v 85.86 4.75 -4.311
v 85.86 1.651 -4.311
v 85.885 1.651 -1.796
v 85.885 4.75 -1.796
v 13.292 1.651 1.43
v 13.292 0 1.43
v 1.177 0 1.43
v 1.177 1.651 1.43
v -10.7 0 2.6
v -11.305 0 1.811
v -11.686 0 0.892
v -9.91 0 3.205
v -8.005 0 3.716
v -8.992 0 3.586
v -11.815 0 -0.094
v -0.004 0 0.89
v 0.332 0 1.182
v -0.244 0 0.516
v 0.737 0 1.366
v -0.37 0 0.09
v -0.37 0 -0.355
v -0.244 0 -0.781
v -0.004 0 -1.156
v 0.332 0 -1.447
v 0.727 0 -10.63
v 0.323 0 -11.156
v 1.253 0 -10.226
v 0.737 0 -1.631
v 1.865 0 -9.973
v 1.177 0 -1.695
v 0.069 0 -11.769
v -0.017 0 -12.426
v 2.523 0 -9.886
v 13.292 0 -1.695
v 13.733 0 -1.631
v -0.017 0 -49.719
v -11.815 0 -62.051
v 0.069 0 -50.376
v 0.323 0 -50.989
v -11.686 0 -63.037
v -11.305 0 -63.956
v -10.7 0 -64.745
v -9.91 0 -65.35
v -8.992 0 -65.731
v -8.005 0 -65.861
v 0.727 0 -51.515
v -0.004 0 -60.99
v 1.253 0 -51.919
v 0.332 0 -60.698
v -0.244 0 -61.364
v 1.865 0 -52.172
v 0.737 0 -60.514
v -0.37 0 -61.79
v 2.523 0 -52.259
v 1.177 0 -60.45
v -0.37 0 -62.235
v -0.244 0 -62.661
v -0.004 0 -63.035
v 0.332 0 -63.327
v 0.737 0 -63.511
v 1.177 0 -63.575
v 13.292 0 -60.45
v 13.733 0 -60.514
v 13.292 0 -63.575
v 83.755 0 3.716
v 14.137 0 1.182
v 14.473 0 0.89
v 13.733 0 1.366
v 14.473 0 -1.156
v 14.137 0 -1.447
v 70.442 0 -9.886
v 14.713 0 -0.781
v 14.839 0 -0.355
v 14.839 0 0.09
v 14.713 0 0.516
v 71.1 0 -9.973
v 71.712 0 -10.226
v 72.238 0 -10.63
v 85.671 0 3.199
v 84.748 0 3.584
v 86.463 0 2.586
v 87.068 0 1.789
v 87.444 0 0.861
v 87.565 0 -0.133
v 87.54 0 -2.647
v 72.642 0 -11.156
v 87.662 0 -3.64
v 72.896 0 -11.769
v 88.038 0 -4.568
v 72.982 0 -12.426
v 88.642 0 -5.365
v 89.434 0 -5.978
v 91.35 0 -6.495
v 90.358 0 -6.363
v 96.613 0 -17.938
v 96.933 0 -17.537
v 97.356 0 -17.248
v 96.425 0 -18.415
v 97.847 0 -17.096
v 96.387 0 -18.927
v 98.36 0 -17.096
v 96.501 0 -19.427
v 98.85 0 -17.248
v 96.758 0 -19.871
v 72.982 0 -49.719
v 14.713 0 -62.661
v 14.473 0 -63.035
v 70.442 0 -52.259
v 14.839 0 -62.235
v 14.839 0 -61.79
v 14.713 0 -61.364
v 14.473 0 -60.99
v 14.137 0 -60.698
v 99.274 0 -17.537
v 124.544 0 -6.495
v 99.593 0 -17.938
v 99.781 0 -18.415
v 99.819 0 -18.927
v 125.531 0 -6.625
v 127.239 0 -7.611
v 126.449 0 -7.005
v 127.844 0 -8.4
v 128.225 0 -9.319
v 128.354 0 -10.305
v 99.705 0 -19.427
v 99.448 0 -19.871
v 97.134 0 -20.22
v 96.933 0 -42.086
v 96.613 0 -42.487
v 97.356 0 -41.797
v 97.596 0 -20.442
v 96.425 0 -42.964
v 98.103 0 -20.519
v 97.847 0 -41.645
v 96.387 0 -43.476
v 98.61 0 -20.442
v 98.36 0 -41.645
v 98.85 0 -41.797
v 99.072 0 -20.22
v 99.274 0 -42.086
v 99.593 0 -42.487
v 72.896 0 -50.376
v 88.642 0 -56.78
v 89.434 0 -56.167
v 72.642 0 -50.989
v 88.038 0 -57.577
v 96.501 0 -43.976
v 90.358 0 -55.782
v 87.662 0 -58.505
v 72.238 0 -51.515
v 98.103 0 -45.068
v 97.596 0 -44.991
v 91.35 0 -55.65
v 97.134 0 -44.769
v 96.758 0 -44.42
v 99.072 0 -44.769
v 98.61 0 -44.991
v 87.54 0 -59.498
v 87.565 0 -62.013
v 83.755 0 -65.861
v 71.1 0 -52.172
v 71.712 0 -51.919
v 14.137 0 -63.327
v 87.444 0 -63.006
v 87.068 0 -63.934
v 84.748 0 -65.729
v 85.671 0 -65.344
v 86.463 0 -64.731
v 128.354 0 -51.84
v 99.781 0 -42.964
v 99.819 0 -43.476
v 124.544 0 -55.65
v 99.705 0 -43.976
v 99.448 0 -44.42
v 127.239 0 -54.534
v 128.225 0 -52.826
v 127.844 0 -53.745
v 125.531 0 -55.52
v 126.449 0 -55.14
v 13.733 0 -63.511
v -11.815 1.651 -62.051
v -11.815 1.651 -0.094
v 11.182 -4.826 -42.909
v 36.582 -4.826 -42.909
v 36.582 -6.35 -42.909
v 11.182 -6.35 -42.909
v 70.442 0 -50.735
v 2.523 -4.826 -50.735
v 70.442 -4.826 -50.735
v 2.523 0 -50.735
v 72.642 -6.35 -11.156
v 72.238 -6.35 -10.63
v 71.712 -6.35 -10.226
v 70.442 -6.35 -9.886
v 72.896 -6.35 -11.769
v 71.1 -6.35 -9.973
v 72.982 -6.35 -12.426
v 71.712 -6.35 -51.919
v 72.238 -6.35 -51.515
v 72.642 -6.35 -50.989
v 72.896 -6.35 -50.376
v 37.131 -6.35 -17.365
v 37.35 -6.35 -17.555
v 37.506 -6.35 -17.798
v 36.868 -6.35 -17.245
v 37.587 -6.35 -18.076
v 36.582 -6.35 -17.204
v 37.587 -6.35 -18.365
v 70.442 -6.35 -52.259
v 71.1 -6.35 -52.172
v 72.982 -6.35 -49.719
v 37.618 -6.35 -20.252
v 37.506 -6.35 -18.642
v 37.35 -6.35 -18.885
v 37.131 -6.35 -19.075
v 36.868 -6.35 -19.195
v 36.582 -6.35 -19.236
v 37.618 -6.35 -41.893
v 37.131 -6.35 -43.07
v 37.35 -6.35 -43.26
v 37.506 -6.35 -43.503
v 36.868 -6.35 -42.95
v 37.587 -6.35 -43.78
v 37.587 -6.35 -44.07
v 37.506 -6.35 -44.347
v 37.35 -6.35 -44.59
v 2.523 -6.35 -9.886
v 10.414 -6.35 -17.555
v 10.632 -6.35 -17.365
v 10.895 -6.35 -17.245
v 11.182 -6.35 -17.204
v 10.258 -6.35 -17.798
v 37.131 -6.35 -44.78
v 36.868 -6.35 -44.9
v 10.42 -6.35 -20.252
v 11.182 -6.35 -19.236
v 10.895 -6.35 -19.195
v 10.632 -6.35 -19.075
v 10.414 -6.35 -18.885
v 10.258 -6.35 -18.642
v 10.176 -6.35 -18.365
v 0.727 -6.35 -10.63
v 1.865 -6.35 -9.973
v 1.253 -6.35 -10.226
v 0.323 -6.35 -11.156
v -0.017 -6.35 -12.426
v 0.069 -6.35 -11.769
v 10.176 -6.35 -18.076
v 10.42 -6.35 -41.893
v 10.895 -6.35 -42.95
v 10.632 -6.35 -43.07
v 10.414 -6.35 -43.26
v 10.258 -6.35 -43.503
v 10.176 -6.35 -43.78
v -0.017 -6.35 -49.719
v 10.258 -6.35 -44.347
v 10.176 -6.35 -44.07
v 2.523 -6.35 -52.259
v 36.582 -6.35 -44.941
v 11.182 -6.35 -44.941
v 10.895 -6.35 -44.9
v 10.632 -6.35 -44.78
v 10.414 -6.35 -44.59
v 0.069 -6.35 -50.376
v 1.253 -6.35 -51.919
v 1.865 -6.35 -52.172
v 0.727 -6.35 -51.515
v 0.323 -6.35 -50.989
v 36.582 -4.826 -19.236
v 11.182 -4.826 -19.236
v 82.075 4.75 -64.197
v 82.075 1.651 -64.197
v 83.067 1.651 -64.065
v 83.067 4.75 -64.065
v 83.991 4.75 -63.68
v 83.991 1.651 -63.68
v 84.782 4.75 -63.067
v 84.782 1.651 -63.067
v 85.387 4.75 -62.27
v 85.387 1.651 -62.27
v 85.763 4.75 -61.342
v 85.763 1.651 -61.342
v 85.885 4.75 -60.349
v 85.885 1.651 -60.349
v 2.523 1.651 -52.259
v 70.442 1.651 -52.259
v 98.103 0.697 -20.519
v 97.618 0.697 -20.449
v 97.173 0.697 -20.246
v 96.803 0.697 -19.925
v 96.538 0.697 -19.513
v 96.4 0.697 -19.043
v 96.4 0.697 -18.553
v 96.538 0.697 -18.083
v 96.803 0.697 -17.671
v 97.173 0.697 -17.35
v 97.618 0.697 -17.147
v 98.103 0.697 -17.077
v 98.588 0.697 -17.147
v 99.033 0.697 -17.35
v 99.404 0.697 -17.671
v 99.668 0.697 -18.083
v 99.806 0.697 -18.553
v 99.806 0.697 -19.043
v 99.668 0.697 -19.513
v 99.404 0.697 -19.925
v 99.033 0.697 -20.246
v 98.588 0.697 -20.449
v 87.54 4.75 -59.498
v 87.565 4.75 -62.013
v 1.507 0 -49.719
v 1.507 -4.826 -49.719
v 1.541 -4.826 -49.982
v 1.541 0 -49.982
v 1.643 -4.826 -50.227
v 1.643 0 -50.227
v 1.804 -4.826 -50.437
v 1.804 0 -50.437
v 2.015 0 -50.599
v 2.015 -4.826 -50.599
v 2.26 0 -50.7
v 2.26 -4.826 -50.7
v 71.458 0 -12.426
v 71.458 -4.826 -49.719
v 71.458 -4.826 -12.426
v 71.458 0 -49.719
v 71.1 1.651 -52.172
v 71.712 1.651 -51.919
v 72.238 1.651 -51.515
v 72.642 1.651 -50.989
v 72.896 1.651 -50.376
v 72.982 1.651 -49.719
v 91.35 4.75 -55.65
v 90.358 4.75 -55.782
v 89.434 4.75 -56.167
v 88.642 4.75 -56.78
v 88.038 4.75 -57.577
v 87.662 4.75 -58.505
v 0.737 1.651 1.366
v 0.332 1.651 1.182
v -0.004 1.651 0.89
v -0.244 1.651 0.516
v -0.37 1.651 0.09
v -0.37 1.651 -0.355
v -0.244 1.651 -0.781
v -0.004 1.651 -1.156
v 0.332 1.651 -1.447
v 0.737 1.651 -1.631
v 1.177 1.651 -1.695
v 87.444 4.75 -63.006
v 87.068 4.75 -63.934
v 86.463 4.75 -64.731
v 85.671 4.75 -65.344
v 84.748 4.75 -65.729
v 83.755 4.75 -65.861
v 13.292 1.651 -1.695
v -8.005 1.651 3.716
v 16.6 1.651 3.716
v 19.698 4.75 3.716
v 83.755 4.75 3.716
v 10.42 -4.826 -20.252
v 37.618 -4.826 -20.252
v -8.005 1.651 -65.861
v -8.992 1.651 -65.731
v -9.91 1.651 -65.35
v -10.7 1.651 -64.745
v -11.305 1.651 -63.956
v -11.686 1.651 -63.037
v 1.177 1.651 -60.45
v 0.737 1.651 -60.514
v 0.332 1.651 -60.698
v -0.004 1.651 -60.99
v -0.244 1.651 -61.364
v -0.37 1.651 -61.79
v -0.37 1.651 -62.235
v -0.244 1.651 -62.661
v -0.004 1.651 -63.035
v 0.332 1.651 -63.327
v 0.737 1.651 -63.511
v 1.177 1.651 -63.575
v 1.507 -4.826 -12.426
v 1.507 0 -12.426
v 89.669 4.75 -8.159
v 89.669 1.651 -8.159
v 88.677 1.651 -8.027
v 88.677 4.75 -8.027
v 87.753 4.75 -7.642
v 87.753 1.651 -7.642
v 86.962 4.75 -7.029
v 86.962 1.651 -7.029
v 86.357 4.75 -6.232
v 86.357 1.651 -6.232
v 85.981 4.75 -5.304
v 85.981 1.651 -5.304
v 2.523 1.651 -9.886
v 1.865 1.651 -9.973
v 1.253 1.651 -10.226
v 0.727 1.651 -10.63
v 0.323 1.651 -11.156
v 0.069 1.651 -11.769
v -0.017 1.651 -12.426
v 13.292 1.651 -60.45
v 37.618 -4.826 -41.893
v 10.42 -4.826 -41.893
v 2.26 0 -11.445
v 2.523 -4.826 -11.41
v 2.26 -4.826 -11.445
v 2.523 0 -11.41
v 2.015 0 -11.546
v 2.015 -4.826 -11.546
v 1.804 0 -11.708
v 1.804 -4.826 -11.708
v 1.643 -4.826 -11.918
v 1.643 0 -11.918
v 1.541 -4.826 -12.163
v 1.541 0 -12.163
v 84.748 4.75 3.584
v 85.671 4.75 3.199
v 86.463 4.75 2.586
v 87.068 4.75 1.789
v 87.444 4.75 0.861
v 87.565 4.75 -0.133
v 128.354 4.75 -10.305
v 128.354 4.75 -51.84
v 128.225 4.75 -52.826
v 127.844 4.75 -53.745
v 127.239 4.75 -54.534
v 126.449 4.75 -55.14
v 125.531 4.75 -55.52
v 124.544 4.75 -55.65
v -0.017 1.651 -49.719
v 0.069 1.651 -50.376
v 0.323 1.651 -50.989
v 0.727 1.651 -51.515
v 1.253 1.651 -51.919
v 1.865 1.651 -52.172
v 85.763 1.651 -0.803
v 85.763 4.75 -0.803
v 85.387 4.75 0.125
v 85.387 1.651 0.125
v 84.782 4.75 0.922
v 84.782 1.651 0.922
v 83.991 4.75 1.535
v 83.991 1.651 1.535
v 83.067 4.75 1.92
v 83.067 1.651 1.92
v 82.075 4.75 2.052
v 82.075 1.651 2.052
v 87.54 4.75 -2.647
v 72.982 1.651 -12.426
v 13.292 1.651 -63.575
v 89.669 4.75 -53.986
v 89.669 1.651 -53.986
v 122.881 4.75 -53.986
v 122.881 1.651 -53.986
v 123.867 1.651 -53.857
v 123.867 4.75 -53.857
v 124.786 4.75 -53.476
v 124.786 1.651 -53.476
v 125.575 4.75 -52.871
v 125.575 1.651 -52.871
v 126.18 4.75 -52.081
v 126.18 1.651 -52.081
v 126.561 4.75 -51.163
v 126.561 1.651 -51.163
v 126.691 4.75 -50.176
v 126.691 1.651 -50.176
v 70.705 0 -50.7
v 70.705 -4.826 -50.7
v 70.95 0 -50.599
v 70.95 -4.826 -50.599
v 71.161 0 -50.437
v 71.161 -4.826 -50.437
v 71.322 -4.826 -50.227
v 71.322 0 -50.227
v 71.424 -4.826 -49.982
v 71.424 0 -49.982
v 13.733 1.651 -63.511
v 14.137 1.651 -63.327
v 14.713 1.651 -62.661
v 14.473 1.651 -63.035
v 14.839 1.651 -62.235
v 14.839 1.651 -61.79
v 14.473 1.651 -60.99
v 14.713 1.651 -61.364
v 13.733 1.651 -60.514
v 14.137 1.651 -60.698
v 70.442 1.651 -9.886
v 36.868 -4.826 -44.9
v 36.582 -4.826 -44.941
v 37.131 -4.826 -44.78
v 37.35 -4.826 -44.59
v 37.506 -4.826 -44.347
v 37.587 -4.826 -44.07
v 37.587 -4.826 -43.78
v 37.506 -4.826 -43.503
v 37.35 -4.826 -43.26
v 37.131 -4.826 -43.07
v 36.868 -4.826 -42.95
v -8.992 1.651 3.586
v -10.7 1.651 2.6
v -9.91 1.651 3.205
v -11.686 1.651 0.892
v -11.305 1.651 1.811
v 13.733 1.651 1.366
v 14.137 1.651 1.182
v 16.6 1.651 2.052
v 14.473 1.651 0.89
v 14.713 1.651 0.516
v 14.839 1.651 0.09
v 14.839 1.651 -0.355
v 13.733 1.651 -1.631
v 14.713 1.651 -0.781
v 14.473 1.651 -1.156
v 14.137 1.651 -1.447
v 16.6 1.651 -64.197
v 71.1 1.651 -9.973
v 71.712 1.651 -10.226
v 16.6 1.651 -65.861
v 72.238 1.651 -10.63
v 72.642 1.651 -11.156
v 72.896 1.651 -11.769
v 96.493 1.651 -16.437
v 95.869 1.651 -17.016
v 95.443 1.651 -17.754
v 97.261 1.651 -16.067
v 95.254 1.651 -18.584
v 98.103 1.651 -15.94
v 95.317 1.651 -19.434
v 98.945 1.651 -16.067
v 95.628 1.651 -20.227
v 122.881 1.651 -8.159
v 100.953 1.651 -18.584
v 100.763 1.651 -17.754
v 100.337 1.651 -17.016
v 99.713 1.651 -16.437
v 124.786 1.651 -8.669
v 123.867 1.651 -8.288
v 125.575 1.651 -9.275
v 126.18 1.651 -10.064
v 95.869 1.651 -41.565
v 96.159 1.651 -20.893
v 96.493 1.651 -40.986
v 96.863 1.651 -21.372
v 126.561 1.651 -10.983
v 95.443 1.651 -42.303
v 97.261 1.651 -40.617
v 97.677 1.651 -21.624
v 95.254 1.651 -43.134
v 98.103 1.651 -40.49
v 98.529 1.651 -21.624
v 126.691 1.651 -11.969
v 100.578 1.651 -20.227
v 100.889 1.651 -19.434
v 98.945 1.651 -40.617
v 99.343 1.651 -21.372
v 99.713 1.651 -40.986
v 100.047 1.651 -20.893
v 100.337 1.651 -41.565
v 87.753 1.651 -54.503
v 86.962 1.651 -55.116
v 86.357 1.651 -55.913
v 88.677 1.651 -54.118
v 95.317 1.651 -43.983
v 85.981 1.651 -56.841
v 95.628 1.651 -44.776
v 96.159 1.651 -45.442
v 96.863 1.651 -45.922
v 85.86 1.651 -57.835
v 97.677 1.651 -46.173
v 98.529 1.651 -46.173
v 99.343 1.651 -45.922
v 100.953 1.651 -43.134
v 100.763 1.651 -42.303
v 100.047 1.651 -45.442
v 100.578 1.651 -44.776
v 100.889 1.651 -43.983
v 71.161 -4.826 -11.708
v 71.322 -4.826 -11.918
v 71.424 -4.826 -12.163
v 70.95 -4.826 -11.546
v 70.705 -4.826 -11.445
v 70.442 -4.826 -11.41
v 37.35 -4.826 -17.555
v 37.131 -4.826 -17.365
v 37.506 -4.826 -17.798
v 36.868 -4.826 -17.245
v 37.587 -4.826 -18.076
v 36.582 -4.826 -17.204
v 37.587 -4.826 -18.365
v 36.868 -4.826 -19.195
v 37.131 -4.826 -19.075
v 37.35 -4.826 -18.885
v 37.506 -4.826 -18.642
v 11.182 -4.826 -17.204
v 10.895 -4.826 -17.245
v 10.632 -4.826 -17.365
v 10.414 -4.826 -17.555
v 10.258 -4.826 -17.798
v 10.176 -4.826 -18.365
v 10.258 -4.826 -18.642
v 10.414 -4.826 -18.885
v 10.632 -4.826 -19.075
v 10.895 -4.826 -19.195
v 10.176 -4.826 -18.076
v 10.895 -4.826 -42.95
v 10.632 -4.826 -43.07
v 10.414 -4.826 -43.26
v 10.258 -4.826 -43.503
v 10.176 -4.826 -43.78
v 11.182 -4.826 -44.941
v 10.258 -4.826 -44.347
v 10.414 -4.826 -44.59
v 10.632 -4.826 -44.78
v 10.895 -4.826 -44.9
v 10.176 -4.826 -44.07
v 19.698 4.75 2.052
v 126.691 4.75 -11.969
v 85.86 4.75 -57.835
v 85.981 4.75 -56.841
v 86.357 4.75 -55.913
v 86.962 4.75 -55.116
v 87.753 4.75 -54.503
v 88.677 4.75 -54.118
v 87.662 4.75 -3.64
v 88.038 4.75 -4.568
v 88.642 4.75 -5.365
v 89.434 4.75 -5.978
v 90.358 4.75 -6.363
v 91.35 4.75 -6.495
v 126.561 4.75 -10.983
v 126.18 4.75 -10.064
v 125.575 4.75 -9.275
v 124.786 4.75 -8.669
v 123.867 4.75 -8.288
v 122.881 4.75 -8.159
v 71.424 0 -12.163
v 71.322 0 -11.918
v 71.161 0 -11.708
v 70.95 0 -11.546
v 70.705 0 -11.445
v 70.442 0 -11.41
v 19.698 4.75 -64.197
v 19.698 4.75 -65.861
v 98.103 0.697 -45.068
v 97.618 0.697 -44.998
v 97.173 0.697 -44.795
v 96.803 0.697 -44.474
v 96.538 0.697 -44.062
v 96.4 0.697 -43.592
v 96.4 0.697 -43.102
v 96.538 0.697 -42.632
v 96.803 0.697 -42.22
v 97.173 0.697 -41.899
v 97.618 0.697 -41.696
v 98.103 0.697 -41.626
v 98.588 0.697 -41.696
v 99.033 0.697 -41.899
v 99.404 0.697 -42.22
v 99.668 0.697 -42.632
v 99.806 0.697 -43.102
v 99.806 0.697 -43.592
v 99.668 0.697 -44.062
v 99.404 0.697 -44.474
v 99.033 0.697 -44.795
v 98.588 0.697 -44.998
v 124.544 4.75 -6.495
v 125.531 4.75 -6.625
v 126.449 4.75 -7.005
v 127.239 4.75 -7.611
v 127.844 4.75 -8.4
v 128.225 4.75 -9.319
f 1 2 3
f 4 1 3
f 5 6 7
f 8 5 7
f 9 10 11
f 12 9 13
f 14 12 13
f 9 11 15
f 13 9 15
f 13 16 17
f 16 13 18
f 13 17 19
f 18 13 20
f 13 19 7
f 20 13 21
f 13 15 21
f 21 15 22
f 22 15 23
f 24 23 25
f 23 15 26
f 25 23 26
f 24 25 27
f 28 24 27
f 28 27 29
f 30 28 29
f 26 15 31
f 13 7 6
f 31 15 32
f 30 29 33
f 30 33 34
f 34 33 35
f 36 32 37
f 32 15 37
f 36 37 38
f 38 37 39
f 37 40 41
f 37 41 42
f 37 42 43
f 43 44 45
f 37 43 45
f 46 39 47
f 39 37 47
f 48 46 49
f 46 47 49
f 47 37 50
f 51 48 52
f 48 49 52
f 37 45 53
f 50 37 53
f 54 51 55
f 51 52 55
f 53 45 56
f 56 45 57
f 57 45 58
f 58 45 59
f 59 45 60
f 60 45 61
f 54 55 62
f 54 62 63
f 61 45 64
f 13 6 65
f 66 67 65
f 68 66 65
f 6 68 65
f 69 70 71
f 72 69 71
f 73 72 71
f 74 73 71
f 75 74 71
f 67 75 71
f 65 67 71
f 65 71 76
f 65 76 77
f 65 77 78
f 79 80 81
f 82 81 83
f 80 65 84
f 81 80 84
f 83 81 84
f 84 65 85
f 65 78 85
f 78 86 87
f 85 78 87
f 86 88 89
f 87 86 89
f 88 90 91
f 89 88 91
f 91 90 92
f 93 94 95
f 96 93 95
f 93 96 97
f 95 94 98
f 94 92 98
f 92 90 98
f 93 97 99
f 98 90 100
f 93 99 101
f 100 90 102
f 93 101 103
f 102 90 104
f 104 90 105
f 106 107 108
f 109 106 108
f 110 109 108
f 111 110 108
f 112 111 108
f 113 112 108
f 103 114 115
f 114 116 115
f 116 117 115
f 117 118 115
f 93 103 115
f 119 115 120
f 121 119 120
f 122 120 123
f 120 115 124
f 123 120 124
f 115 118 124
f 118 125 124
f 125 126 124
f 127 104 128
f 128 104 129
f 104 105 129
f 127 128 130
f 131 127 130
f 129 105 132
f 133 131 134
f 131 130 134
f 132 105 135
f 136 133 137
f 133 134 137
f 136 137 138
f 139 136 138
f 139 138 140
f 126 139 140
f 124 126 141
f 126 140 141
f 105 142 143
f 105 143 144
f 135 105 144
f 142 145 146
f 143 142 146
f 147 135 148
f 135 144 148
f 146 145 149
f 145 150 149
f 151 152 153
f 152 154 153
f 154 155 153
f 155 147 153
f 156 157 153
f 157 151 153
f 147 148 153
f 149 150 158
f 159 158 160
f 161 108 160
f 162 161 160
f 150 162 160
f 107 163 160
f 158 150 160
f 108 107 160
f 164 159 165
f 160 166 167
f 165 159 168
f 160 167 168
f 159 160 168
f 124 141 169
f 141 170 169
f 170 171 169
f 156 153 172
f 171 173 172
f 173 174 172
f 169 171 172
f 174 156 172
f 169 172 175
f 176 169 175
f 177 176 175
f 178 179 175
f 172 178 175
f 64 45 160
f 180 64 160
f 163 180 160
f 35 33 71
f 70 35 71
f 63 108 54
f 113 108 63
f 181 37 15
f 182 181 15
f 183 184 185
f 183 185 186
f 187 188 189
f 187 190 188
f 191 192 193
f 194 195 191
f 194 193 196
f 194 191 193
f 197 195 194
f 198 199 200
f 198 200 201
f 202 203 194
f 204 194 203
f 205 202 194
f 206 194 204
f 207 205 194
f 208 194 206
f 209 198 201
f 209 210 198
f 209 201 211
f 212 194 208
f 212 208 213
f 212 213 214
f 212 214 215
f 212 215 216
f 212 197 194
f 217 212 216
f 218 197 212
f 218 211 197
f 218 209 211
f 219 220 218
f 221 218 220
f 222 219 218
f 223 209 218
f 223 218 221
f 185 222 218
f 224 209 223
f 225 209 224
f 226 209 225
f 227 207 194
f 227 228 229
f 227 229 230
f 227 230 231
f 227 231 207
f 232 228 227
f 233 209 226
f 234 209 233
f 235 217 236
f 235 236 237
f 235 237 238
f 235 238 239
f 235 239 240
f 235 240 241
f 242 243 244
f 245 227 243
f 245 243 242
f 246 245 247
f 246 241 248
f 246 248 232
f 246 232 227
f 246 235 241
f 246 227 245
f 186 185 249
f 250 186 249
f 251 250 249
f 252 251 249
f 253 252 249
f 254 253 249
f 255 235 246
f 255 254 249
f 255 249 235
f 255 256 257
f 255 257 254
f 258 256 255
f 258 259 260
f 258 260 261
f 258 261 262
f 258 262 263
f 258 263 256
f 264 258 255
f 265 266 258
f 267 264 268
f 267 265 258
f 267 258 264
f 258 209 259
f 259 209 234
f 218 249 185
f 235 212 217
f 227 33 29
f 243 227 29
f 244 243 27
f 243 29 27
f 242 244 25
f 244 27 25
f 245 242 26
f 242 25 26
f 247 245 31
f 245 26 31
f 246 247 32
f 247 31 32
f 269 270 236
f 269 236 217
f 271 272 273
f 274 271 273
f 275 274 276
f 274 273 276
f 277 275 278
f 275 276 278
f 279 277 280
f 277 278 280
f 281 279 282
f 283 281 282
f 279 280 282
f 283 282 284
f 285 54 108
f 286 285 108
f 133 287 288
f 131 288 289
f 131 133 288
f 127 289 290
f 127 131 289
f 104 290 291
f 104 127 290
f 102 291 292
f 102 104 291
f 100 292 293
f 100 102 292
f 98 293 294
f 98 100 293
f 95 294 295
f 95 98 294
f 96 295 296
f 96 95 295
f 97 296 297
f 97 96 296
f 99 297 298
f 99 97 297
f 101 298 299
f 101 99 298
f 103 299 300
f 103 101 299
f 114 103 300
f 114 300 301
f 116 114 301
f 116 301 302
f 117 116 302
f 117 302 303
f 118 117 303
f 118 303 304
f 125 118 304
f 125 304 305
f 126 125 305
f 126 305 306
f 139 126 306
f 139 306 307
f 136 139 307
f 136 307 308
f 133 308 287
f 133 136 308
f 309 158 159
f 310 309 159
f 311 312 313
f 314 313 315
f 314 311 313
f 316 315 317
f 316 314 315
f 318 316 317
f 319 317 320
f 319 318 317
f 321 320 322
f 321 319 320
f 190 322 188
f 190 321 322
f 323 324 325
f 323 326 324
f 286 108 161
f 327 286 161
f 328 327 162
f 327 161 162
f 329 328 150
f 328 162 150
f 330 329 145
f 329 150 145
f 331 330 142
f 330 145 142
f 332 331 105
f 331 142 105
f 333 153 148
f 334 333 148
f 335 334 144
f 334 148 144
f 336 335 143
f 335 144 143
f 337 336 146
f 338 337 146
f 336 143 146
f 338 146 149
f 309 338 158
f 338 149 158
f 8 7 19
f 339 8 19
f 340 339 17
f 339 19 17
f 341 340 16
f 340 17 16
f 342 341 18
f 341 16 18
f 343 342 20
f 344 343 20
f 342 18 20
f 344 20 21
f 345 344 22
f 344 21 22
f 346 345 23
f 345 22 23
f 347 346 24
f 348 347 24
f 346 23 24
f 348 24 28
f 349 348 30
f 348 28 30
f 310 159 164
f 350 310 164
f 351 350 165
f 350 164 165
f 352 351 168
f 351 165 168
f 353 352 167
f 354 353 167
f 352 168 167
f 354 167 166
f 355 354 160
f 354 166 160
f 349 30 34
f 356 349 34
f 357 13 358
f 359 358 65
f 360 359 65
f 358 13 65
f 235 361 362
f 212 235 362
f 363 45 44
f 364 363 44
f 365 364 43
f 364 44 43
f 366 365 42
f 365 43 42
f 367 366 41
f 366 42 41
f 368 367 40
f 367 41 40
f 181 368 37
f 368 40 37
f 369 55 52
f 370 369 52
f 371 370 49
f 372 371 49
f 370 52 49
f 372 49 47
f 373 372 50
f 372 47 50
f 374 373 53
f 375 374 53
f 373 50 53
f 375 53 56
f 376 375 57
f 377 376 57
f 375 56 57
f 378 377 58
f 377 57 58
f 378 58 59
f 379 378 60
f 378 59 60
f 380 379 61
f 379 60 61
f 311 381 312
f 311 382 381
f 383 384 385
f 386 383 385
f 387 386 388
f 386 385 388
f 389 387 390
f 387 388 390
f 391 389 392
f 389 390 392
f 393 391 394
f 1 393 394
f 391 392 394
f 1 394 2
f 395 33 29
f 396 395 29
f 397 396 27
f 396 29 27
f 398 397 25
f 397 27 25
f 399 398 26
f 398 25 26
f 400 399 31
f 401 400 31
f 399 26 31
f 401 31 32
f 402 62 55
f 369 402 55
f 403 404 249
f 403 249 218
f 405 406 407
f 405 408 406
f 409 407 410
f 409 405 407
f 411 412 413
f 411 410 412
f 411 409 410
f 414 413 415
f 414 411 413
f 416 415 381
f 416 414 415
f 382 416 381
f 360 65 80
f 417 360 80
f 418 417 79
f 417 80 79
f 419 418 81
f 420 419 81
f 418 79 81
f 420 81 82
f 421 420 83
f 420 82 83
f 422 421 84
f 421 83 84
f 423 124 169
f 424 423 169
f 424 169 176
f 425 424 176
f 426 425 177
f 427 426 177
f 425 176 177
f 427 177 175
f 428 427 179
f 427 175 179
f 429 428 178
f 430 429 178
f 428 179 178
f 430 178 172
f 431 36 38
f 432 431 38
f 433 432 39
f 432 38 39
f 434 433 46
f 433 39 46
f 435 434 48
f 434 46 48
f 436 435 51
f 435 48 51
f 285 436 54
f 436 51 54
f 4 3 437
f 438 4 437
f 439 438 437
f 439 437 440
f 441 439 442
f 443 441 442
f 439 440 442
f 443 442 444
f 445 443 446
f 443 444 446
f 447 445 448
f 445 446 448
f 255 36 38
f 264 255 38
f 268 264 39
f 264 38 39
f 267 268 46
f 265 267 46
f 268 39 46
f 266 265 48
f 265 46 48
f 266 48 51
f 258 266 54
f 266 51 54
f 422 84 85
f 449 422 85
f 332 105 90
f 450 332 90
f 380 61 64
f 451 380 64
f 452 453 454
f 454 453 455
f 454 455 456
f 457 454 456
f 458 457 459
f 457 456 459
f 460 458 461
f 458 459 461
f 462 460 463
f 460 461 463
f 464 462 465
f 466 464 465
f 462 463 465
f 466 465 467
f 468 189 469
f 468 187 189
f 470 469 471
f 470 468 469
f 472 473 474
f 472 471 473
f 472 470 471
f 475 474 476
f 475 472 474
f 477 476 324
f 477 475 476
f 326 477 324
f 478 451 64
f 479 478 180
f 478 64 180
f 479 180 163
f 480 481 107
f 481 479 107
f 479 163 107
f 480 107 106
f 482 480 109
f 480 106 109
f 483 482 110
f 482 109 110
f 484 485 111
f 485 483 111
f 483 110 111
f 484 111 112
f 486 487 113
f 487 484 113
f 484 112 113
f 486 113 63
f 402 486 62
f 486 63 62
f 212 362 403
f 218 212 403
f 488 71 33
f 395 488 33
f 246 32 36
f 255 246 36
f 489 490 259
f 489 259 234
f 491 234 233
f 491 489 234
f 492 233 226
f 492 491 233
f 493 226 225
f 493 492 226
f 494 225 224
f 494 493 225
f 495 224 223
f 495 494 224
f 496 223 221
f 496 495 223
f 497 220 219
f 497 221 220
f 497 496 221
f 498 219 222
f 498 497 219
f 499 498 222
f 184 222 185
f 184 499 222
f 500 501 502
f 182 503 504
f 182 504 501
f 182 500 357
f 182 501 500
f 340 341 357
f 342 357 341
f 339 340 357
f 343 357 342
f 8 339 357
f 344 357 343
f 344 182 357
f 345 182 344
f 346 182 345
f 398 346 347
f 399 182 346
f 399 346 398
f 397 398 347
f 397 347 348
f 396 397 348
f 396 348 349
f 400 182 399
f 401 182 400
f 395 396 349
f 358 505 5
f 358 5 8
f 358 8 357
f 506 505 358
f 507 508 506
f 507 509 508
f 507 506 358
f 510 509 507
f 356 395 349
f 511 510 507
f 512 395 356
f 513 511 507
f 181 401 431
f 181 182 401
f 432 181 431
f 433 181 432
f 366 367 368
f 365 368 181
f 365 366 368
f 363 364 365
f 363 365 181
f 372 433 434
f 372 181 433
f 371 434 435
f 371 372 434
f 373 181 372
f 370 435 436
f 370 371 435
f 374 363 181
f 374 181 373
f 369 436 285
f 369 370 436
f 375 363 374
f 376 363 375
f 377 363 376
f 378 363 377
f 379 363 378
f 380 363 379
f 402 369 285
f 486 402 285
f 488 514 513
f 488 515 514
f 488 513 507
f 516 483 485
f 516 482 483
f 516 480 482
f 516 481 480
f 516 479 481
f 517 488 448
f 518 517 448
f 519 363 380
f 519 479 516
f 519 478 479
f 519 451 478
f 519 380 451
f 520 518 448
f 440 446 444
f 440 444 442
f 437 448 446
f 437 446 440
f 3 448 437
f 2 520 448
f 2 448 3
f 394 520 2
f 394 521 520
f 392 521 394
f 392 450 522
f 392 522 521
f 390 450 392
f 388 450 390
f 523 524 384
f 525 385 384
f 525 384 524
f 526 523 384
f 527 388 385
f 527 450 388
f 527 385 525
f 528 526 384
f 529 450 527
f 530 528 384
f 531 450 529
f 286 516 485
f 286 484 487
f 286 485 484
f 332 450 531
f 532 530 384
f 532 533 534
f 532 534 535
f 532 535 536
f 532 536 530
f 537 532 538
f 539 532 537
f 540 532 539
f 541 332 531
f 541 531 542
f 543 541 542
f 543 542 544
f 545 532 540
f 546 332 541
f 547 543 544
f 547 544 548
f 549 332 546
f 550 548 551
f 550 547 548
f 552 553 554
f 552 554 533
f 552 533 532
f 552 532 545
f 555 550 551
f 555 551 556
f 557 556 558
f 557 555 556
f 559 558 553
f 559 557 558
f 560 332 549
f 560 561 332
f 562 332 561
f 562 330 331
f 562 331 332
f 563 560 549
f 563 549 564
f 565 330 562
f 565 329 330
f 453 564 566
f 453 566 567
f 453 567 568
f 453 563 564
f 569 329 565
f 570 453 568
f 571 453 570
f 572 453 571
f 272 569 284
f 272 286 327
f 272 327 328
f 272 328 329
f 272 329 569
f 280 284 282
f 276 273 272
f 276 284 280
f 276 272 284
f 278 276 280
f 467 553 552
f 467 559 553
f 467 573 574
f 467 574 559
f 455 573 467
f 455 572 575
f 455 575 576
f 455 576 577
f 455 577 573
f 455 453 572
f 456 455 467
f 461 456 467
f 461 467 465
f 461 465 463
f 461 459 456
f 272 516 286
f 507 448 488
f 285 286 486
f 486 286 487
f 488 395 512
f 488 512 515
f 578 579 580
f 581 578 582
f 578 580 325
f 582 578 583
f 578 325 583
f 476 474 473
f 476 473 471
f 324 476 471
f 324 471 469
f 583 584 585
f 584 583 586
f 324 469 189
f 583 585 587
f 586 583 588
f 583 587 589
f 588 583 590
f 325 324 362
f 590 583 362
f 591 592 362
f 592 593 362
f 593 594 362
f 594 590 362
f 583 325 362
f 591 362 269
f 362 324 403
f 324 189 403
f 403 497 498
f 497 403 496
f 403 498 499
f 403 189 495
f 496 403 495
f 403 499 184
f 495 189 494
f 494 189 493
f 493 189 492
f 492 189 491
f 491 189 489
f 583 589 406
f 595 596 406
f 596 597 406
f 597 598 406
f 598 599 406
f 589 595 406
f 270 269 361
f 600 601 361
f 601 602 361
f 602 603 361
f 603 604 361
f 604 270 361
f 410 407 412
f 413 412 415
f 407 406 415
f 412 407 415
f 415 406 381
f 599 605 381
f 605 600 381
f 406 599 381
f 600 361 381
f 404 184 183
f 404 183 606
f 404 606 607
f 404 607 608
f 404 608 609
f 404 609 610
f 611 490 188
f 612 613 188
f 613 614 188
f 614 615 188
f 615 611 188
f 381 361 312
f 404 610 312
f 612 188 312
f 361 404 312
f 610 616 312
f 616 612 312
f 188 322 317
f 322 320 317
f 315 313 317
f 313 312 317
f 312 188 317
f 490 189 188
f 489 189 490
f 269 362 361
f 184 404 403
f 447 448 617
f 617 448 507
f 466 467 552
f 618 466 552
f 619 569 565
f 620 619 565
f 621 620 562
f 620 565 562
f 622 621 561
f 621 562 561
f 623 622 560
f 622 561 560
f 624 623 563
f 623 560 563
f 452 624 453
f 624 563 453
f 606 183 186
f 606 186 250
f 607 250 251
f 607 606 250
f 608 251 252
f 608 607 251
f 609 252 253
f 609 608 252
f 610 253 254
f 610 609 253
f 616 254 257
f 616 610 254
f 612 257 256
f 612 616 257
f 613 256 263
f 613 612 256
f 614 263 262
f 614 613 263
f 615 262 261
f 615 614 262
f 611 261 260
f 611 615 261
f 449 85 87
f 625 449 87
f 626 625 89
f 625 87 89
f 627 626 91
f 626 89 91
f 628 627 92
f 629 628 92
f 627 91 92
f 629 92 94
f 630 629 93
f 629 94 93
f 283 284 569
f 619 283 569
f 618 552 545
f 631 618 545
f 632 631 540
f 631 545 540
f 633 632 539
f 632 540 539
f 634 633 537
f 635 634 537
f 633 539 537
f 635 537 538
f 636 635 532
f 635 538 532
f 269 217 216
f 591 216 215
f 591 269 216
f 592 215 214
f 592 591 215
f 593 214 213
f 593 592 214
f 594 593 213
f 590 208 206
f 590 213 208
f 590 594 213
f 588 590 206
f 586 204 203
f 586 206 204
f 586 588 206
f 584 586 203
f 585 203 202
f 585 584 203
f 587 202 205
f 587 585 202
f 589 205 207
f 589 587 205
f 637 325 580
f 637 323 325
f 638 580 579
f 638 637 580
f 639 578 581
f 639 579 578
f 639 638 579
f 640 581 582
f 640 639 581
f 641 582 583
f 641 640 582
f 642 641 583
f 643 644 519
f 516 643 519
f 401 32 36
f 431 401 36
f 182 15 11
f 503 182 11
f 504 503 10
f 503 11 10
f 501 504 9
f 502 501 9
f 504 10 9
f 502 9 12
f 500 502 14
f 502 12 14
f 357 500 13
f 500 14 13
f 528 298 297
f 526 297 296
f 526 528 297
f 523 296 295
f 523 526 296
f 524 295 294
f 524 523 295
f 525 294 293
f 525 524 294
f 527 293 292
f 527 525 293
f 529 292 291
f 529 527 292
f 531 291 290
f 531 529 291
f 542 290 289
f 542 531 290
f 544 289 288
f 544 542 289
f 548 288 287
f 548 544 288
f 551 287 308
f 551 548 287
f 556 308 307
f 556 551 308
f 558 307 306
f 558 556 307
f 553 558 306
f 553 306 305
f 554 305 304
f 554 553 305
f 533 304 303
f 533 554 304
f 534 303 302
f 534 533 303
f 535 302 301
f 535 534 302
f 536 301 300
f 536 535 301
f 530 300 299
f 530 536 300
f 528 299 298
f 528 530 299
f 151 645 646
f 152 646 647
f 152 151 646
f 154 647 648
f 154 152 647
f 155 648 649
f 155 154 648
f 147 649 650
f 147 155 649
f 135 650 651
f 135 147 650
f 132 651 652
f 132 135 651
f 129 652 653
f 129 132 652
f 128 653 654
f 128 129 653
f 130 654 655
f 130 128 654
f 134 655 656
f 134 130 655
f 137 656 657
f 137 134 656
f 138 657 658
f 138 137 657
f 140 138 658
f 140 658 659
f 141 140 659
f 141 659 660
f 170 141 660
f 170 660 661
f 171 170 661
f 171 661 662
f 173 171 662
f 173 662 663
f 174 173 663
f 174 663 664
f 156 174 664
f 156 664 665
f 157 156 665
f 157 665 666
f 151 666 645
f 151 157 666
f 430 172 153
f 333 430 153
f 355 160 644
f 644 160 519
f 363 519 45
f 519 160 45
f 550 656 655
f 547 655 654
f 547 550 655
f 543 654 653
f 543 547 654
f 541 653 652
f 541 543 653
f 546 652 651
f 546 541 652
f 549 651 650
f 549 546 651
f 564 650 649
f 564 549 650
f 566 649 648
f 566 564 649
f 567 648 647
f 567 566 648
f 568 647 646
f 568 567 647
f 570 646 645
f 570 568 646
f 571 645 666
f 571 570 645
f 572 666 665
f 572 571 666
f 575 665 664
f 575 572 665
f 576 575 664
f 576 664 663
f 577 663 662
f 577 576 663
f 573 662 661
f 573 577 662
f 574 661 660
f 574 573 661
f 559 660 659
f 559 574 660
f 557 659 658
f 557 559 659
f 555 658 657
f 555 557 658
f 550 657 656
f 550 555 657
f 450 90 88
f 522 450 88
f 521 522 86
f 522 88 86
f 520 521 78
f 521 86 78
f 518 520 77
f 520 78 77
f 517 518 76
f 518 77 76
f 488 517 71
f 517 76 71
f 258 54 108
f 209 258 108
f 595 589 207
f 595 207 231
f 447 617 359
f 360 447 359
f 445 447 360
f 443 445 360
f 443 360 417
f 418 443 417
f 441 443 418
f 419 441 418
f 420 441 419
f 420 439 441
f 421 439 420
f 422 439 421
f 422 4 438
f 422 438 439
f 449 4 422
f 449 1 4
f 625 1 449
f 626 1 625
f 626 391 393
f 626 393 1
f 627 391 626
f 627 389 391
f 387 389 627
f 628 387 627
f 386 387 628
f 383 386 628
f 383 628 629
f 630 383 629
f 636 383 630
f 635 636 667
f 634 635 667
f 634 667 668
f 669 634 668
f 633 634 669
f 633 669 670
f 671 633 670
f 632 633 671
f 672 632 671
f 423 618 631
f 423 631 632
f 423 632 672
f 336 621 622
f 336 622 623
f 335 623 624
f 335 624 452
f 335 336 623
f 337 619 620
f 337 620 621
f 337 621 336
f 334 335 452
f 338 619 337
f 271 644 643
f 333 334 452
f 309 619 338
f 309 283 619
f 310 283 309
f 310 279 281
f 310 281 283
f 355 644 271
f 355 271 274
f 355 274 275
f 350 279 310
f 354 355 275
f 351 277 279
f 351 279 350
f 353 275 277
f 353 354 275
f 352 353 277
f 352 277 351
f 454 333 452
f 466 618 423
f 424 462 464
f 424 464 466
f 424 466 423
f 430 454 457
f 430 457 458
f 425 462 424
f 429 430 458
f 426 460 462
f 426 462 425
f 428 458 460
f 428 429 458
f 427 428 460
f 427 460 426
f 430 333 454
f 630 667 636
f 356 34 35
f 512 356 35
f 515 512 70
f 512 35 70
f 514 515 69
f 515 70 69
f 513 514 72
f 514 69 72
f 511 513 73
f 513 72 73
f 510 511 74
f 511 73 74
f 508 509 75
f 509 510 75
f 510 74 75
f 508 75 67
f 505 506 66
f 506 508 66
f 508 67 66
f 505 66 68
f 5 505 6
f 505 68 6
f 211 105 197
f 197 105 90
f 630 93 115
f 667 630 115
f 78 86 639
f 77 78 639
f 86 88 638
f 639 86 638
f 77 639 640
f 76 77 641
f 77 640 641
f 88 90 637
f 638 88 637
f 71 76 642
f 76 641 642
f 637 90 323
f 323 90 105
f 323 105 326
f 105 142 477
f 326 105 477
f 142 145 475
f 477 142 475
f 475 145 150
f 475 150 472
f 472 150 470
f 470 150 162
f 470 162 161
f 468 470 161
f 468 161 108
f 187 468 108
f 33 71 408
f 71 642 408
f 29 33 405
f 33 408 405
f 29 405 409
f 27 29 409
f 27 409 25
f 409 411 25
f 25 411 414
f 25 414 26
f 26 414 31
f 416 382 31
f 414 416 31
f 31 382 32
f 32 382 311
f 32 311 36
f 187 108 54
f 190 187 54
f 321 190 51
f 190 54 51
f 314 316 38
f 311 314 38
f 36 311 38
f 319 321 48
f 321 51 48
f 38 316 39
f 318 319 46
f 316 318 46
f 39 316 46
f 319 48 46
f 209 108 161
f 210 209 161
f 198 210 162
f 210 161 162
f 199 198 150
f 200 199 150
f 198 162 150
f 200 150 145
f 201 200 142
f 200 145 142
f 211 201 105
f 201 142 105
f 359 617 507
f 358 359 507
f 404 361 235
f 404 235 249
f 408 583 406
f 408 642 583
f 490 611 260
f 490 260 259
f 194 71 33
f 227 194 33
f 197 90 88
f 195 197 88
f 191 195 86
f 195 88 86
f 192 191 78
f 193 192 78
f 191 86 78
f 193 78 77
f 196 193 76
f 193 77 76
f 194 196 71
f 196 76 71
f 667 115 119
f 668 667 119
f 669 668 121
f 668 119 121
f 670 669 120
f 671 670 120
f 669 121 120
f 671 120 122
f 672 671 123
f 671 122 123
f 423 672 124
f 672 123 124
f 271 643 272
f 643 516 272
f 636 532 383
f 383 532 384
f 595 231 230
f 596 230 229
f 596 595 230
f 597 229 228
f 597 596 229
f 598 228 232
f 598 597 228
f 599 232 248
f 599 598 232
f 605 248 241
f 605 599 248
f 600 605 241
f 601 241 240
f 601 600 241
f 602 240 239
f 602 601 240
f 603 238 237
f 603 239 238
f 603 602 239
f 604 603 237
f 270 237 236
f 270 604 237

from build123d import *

# Parameters (mm, degrees)
SKETCH3_R                                 = 1.72085
BOSS_EXTRUDE3_DEPTH                       = 1.651
BOSS_EXTRUDE4_DEPTH                       = 4.7498
BOSS_EXTRUDE5_DEPTH                       = 6.35
SHELL1_T                                  = -1.524
SKETCH6_W                                 = 27.197772805
SKETCH6_H                                 = 21.6408
CUT_EXTRUDE1_DEPTH                        = 6.35
CSK_FOR_4_FLAT_HEAD_MACHINE_SCREW_2_COUNT = 2
CSK_FOR_4_FLAT_HEAD_MACHINE_SCREW_2_PITCH = 24.5491
CHAMFER2_SIZE                             = 4.92


with BuildPart() as part:
    # Sketch3 → Boss-Extrude3 (new body)
    with BuildSketch(Plane(origin=(0, 0, 0), x_dir=(1, 0, 0), z_dir=(0, 1, 0))):
        with BuildLine():
            Line((14.778331881, 64.196901379), (14.778331881, 65.860601379))
            Line((14.778331881, 65.860601379), (-8.005468119, 65.860601379))
            ThreePointArc((-8.005468119, 65.860601379), (-10.699544955, 64.744678215), (-11.815468119, 62.050601379))
            Line((-11.815468119, 62.050601379), (-11.815468119, 0.094456509))
            ThreePointArc((-11.815468119, 0.094456509), (-10.699544955, -2.599620328), (-8.005468119, -3.715543491))
            Line((-8.005468119, -3.715543491), (14.778331881, -3.715543491))
            Line((14.778331881, -3.715543491), (14.778331881, -2.051843491))
            Line((14.778331881, -2.051843491), (82.074957291, -2.051843491))
            ThreePointArc((82.074957291, -2.051843491), (84.782471003, -0.922416098), (85.884766787, 1.796256509))
            Line((85.884766787, 1.796256509), (85.859622964, 4.310513079))
            ThreePointArc((85.859622964, 4.310513079), (86.961918747, 7.029185686), (89.669432459, 8.158613079))
            Line((89.669432459, 8.158613079), (122.880731881, 8.158613079))
            ThreePointArc((122.880731881, 8.158613079), (125.574808718, 9.274536243), (126.690731881, 11.968613079))
            Line((126.690731881, 11.968613079), (126.690731881, 50.176444808))
            ThreePointArc((126.690731881, 50.176444808), (125.574808718, 52.870521644), (122.880731881, 53.986444808))
            Line((122.880731881, 53.986444808), (89.669432459, 53.986444808))
            ThreePointArc((89.669432459, 53.986444808), (86.961918747, 55.115872201), (85.859622964, 57.834544808))
            Line((85.859622964, 57.834544808), (85.884766787, 60.348801379))
            ThreePointArc((85.884766787, 60.348801379), (84.782471003, 63.067473985), (82.074957291, 64.196901379))
            Line((82.074957291, 64.196901379), (14.778331881, 64.196901379))
        make_face()
        with BuildLine():
            ThreePointArc((1.176631881, -1.429543491), (-0.385468119, 0.132556509), (1.176631881, 1.694656509))
            Line((1.176631881, 1.694656509), (13.292431881, 1.694656509))
            ThreePointArc((13.292431881, 1.694656509), (14.854531881, 0.132556509), (13.292431881, -1.429543491))
            Line((13.292431881, -1.429543491), (1.176631881, -1.429543491))
        make_face(mode=Mode.SUBTRACT)
        with BuildLine():
            ThreePointArc((-0.017168119, 49.718901379), (0.726780657, 51.514952603), (2.522831881, 52.258901379))
            Line((2.522831881, 52.258901379), (70.442431881, 52.258901379))
            ThreePointArc((70.442431881, 52.258901379), (72.238483106, 51.514952603), (72.982431881, 49.718901379))
            Line((72.982431881, 49.718901379), (72.982431881, 12.426156509))
            ThreePointArc((72.982431881, 12.426156509), (72.238483106, 10.630105284), (70.442431881, 9.886156509))
            Line((70.442431881, 9.886156509), (2.522831881, 9.886156509))
            ThreePointArc((2.522831881, 9.886156509), (0.726780657, 10.630105284), (-0.017168119, 12.426156509))
            Line((-0.017168119, 12.426156509), (-0.017168119, 49.718901379))
        make_face(mode=Mode.SUBTRACT)
        with Locations(Location((98.103031881, 18.797978944, 0), (0, 0, 90))):
            Circle(SKETCH3_R, mode=Mode.SUBTRACT)
        with BuildLine():
            ThreePointArc((1.176631881, 60.450401379), (-0.385468119, 62.012501379), (1.176631881, 63.574601379))
            Line((1.176631881, 63.574601379), (13.292431881, 63.574601379))
            ThreePointArc((13.292431881, 63.574601379), (14.854531881, 62.012501379), (13.292431881, 60.450401379))
            Line((13.292431881, 60.450401379), (1.176631881, 60.450401379))
        make_face(mode=Mode.SUBTRACT)
        with Locations(Location((98.103031881, 43.347078944, 0), (0, 0, 90))):
            Circle(SKETCH3_R, mode=Mode.SUBTRACT)
    extrude(amount=BOSS_EXTRUDE3_DEPTH)

    # Sketch3<4> → Boss-Extrude4 (add)
    with BuildSketch(Plane(origin=(0, 0, 0), x_dir=(1, 0, 0), z_dir=(0, 1, 0))):
        with BuildLine():
            Line((87.540043987, 59.498244808), (87.56518781, 62.012501379))
            ThreePointArc((87.56518781, 62.012501379), (86.462892026, 64.731173985), (83.755378315, 65.860601379))
            Line((83.755378315, 65.860601379), (14.778331881, 65.860601379))
            Line((14.778331881, 65.860601379), (14.778331881, 64.196901379))
            Line((14.778331881, 64.196901379), (82.074957291, 64.196901379))
            ThreePointArc((82.074957291, 64.196901379), (84.782471003, 63.067473985), (85.884766787, 60.348801379))
            Line((85.884766787, 60.348801379), (85.859622964, 57.834544808))
            ThreePointArc((85.859622964, 57.834544808), (86.961918747, 55.115872201), (89.669432459, 53.986444808))
            Line((89.669432459, 53.986444808), (122.880731881, 53.986444808))
            ThreePointArc((122.880731881, 53.986444808), (125.574808718, 52.870521644), (126.690731881, 50.176444808))
            Line((126.690731881, 50.176444808), (126.690731881, 11.968613079))
            ThreePointArc((126.690731881, 11.968613079), (125.574808718, 9.274536243), (122.880731881, 8.158613079))
            Line((122.880731881, 8.158613079), (89.669432459, 8.158613079))
            ThreePointArc((89.669432459, 8.158613079), (86.961918747, 7.029185686), (85.859622964, 4.310513079))
            Line((85.859622964, 4.310513079), (85.884766787, 1.796256509))
            ThreePointArc((85.884766787, 1.796256509), (84.782471003, -0.922416098), (82.074957291, -2.051843491))
            Line((82.074957291, -2.051843491), (14.778331881, -2.051843491))
            Line((14.778331881, -2.051843491), (14.778331881, -3.715543491))
            Line((14.778331881, -3.715543491), (83.755378315, -3.715543491))
            ThreePointArc((83.755378315, -3.715543491), (86.462892026, -2.586116098), (87.56518781, 0.132556509))
            Line((87.56518781, 0.132556509), (87.540043987, 2.646813079))
            ThreePointArc((87.540043987, 2.646813079), (88.64233977, 5.365485686), (91.349853482, 6.494913079))
            Line((91.349853482, 6.494913079), (124.544431881, 6.494913079))
            ThreePointArc((124.544431881, 6.494913079), (127.238508718, 7.610836243), (128.354431881, 10.304913079))
            Line((128.354431881, 10.304913079), (128.354431881, 51.840144808))
            ThreePointArc((128.354431881, 51.840144808), (127.238508718, 54.534221644), (124.544431881, 55.650144808))
            Line((124.544431881, 55.650144808), (91.349853482, 55.650144808))
            ThreePointArc((91.349853482, 55.650144808), (88.64233977, 56.779572201), (87.540043987, 59.498244808))
        make_face()
    extrude(amount=BOSS_EXTRUDE4_DEPTH)

    # Sketch9 → CSK for #4 Flat Head Machine Screw (100)1 (revolve, cut)
    with BuildSketch(Plane(origin=(98.103031881, 1.651, -43.347078944), x_dir=(0, 0, 1), z_dir=(1, 0, 0))):
        Polygon((0, 0), (0, 8.001), (1.63195, 8.001), (1.63195, 1.028358553), (2.8575, 0), align=None)
    csk_for_4_flat_head_machine_screw_100 = revolve(axis=Axis((98.103031881, 8.001, -43.347078944), (0, -1, 0)), mode=Mode.SUBTRACT)

    # CSK for _4 Flat Head Machine Screw _ 2: CSK for #4 Flat Head Machine Screw (100)1 ×2
    with Locations(*[(0, 0, i * CSK_FOR_4_FLAT_HEAD_MACHINE_SCREW_2_PITCH) for i in range(1, CSK_FOR_4_FLAT_HEAD_MACHINE_SCREW_2_COUNT)]):
        add(csk_for_4_flat_head_machine_screw_100, mode=Mode.SUBTRACT)

    # Chamfer2
    # the kernel refuses this chamfer: 4.92 mm, written as the material it takes off along each edge
    with BuildSketch(Plane(origin=(14.778331881, 4.7498, -10.600836809), x_dir=(0.9996219169112966, 0.027495876610586407, 0), z_dir=(0, 0, 1))) as chamfer2_piece_1_section:
        Polygon((CHAMFER2_SIZE * 0.999621916911, -CHAMFER2_SIZE * 0.0274958766106), (-CHAMFER2_SIZE * 0.0274958766106, -CHAMFER2_SIZE * 0.999621916911), (0, 0), align=None)
    chamfer2_piece_1 = extrude(amount=26.969060602, mode=Mode.PRIVATE)
    chamfer2_piece_1 = split(chamfer2_piece_1, bisect_by=Plane(origin=(16.59853765, 1.651, 2.883693491), z_dir=(0, 1, 0)), keep=Keep.TOP, mode=Mode.PRIVATE)
    add(chamfer2_piece_1, mode=Mode.SUBTRACT)
    with BuildSketch(Plane(origin=(14.778331881, 4.7498, -78.513281679), x_dir=(0.9996219169112966, 0.027495876610586407, 0), z_dir=(0, 0, 1))) as chamfer2_piece_2_section:
        Polygon((CHAMFER2_SIZE * 0.999621916911, -CHAMFER2_SIZE * 0.0274958766106), (-CHAMFER2_SIZE * 0.0274958766106, -CHAMFER2_SIZE * 0.999621916911), (0, 0), align=None)
    chamfer2_piece_2 = extrude(amount=26.969060602, mode=Mode.PRIVATE)
    chamfer2_piece_2 = split(chamfer2_piece_2, bisect_by=Plane(origin=(16.59853765, 1.651, -65.028751379), z_dir=(0, 1, 0)), keep=Keep.TOP, mode=Mode.PRIVATE)
    add(chamfer2_piece_2, mode=Mode.SUBTRACT)


with BuildPart() as body_2:
    # Sketch3<5> → Boss-Extrude5 (new body)
    with BuildSketch(Plane(origin=(0, 0, 0), x_dir=(1, 0, 0), z_dir=(0, 1, 0))):
        with BuildLine():
            ThreePointArc((-0.017168119, 49.718901379), (0.726780657, 51.514952603), (2.522831881, 52.258901379))
            Line((2.522831881, 52.258901379), (70.442431881, 52.258901379))
            ThreePointArc((70.442431881, 52.258901379), (72.238483106, 51.514952603), (72.982431881, 49.718901379))
            Line((72.982431881, 49.718901379), (72.982431881, 12.426156509))
            ThreePointArc((72.982431881, 12.426156509), (72.238483106, 10.630105284), (70.442431881, 9.886156509))
            Line((70.442431881, 9.886156509), (2.522831881, 9.886156509))
            ThreePointArc((2.522831881, 9.886156509), (0.726780657, 10.630105284), (-0.017168119, 12.426156509))
            Line((-0.017168119, 12.426156509), (-0.017168119, 49.718901379))
        make_face()
    extrude(amount=-BOSS_EXTRUDE5_DEPTH)

    # Shell1
    shell1_openings = [body_2.faces().sort_by_distance(p)[0] for p in [
        (36.482631881, 0, -31.072528944),
    ]]
    offset(amount=SHELL1_T, openings=shell1_openings, kind=Kind.INTERSECTION)

    # Sketch6 → Cut-Extrude1 (cut)
    with BuildSketch(Plane(origin=(0, -4.826, 0), x_dir=(1, 0, 0), z_dir=(0, 1, 0))):
        with BuildLine():
            Line((11.181733129, 44.940928944), (36.581733129, 44.940928944))
            ThreePointArc((36.581733129, 44.940928944), (37.597733129, 43.924928944), (36.581733129, 42.908928944))
            Line((36.581733129, 42.908928944), (11.181733129, 42.908928944))
            ThreePointArc((11.181733129, 42.908928944), (10.165733129, 43.924928944), (11.181733129, 44.940928944))
        make_face()
        with BuildLine():
            Line((11.181733129, 19.236128944), (36.581733129, 19.236128944))
            ThreePointArc((36.581733129, 19.236128944), (37.597733129, 18.220128944), (36.581733129, 17.204128944))
            Line((36.581733129, 17.204128944), (11.181733129, 17.204128944))
            ThreePointArc((11.181733129, 17.204128944), (10.165733129, 18.220128944), (11.181733129, 19.236128944))
        make_face()
        with Locations((24.018619532, 31.072528944)):
            Rectangle(SKETCH6_W, SKETCH6_H)
    extrude(amount=-CUT_EXTRUDE1_DEPTH, mode=Mode.SUBTRACT)


solid = Compound([part.part, body_2.part])
